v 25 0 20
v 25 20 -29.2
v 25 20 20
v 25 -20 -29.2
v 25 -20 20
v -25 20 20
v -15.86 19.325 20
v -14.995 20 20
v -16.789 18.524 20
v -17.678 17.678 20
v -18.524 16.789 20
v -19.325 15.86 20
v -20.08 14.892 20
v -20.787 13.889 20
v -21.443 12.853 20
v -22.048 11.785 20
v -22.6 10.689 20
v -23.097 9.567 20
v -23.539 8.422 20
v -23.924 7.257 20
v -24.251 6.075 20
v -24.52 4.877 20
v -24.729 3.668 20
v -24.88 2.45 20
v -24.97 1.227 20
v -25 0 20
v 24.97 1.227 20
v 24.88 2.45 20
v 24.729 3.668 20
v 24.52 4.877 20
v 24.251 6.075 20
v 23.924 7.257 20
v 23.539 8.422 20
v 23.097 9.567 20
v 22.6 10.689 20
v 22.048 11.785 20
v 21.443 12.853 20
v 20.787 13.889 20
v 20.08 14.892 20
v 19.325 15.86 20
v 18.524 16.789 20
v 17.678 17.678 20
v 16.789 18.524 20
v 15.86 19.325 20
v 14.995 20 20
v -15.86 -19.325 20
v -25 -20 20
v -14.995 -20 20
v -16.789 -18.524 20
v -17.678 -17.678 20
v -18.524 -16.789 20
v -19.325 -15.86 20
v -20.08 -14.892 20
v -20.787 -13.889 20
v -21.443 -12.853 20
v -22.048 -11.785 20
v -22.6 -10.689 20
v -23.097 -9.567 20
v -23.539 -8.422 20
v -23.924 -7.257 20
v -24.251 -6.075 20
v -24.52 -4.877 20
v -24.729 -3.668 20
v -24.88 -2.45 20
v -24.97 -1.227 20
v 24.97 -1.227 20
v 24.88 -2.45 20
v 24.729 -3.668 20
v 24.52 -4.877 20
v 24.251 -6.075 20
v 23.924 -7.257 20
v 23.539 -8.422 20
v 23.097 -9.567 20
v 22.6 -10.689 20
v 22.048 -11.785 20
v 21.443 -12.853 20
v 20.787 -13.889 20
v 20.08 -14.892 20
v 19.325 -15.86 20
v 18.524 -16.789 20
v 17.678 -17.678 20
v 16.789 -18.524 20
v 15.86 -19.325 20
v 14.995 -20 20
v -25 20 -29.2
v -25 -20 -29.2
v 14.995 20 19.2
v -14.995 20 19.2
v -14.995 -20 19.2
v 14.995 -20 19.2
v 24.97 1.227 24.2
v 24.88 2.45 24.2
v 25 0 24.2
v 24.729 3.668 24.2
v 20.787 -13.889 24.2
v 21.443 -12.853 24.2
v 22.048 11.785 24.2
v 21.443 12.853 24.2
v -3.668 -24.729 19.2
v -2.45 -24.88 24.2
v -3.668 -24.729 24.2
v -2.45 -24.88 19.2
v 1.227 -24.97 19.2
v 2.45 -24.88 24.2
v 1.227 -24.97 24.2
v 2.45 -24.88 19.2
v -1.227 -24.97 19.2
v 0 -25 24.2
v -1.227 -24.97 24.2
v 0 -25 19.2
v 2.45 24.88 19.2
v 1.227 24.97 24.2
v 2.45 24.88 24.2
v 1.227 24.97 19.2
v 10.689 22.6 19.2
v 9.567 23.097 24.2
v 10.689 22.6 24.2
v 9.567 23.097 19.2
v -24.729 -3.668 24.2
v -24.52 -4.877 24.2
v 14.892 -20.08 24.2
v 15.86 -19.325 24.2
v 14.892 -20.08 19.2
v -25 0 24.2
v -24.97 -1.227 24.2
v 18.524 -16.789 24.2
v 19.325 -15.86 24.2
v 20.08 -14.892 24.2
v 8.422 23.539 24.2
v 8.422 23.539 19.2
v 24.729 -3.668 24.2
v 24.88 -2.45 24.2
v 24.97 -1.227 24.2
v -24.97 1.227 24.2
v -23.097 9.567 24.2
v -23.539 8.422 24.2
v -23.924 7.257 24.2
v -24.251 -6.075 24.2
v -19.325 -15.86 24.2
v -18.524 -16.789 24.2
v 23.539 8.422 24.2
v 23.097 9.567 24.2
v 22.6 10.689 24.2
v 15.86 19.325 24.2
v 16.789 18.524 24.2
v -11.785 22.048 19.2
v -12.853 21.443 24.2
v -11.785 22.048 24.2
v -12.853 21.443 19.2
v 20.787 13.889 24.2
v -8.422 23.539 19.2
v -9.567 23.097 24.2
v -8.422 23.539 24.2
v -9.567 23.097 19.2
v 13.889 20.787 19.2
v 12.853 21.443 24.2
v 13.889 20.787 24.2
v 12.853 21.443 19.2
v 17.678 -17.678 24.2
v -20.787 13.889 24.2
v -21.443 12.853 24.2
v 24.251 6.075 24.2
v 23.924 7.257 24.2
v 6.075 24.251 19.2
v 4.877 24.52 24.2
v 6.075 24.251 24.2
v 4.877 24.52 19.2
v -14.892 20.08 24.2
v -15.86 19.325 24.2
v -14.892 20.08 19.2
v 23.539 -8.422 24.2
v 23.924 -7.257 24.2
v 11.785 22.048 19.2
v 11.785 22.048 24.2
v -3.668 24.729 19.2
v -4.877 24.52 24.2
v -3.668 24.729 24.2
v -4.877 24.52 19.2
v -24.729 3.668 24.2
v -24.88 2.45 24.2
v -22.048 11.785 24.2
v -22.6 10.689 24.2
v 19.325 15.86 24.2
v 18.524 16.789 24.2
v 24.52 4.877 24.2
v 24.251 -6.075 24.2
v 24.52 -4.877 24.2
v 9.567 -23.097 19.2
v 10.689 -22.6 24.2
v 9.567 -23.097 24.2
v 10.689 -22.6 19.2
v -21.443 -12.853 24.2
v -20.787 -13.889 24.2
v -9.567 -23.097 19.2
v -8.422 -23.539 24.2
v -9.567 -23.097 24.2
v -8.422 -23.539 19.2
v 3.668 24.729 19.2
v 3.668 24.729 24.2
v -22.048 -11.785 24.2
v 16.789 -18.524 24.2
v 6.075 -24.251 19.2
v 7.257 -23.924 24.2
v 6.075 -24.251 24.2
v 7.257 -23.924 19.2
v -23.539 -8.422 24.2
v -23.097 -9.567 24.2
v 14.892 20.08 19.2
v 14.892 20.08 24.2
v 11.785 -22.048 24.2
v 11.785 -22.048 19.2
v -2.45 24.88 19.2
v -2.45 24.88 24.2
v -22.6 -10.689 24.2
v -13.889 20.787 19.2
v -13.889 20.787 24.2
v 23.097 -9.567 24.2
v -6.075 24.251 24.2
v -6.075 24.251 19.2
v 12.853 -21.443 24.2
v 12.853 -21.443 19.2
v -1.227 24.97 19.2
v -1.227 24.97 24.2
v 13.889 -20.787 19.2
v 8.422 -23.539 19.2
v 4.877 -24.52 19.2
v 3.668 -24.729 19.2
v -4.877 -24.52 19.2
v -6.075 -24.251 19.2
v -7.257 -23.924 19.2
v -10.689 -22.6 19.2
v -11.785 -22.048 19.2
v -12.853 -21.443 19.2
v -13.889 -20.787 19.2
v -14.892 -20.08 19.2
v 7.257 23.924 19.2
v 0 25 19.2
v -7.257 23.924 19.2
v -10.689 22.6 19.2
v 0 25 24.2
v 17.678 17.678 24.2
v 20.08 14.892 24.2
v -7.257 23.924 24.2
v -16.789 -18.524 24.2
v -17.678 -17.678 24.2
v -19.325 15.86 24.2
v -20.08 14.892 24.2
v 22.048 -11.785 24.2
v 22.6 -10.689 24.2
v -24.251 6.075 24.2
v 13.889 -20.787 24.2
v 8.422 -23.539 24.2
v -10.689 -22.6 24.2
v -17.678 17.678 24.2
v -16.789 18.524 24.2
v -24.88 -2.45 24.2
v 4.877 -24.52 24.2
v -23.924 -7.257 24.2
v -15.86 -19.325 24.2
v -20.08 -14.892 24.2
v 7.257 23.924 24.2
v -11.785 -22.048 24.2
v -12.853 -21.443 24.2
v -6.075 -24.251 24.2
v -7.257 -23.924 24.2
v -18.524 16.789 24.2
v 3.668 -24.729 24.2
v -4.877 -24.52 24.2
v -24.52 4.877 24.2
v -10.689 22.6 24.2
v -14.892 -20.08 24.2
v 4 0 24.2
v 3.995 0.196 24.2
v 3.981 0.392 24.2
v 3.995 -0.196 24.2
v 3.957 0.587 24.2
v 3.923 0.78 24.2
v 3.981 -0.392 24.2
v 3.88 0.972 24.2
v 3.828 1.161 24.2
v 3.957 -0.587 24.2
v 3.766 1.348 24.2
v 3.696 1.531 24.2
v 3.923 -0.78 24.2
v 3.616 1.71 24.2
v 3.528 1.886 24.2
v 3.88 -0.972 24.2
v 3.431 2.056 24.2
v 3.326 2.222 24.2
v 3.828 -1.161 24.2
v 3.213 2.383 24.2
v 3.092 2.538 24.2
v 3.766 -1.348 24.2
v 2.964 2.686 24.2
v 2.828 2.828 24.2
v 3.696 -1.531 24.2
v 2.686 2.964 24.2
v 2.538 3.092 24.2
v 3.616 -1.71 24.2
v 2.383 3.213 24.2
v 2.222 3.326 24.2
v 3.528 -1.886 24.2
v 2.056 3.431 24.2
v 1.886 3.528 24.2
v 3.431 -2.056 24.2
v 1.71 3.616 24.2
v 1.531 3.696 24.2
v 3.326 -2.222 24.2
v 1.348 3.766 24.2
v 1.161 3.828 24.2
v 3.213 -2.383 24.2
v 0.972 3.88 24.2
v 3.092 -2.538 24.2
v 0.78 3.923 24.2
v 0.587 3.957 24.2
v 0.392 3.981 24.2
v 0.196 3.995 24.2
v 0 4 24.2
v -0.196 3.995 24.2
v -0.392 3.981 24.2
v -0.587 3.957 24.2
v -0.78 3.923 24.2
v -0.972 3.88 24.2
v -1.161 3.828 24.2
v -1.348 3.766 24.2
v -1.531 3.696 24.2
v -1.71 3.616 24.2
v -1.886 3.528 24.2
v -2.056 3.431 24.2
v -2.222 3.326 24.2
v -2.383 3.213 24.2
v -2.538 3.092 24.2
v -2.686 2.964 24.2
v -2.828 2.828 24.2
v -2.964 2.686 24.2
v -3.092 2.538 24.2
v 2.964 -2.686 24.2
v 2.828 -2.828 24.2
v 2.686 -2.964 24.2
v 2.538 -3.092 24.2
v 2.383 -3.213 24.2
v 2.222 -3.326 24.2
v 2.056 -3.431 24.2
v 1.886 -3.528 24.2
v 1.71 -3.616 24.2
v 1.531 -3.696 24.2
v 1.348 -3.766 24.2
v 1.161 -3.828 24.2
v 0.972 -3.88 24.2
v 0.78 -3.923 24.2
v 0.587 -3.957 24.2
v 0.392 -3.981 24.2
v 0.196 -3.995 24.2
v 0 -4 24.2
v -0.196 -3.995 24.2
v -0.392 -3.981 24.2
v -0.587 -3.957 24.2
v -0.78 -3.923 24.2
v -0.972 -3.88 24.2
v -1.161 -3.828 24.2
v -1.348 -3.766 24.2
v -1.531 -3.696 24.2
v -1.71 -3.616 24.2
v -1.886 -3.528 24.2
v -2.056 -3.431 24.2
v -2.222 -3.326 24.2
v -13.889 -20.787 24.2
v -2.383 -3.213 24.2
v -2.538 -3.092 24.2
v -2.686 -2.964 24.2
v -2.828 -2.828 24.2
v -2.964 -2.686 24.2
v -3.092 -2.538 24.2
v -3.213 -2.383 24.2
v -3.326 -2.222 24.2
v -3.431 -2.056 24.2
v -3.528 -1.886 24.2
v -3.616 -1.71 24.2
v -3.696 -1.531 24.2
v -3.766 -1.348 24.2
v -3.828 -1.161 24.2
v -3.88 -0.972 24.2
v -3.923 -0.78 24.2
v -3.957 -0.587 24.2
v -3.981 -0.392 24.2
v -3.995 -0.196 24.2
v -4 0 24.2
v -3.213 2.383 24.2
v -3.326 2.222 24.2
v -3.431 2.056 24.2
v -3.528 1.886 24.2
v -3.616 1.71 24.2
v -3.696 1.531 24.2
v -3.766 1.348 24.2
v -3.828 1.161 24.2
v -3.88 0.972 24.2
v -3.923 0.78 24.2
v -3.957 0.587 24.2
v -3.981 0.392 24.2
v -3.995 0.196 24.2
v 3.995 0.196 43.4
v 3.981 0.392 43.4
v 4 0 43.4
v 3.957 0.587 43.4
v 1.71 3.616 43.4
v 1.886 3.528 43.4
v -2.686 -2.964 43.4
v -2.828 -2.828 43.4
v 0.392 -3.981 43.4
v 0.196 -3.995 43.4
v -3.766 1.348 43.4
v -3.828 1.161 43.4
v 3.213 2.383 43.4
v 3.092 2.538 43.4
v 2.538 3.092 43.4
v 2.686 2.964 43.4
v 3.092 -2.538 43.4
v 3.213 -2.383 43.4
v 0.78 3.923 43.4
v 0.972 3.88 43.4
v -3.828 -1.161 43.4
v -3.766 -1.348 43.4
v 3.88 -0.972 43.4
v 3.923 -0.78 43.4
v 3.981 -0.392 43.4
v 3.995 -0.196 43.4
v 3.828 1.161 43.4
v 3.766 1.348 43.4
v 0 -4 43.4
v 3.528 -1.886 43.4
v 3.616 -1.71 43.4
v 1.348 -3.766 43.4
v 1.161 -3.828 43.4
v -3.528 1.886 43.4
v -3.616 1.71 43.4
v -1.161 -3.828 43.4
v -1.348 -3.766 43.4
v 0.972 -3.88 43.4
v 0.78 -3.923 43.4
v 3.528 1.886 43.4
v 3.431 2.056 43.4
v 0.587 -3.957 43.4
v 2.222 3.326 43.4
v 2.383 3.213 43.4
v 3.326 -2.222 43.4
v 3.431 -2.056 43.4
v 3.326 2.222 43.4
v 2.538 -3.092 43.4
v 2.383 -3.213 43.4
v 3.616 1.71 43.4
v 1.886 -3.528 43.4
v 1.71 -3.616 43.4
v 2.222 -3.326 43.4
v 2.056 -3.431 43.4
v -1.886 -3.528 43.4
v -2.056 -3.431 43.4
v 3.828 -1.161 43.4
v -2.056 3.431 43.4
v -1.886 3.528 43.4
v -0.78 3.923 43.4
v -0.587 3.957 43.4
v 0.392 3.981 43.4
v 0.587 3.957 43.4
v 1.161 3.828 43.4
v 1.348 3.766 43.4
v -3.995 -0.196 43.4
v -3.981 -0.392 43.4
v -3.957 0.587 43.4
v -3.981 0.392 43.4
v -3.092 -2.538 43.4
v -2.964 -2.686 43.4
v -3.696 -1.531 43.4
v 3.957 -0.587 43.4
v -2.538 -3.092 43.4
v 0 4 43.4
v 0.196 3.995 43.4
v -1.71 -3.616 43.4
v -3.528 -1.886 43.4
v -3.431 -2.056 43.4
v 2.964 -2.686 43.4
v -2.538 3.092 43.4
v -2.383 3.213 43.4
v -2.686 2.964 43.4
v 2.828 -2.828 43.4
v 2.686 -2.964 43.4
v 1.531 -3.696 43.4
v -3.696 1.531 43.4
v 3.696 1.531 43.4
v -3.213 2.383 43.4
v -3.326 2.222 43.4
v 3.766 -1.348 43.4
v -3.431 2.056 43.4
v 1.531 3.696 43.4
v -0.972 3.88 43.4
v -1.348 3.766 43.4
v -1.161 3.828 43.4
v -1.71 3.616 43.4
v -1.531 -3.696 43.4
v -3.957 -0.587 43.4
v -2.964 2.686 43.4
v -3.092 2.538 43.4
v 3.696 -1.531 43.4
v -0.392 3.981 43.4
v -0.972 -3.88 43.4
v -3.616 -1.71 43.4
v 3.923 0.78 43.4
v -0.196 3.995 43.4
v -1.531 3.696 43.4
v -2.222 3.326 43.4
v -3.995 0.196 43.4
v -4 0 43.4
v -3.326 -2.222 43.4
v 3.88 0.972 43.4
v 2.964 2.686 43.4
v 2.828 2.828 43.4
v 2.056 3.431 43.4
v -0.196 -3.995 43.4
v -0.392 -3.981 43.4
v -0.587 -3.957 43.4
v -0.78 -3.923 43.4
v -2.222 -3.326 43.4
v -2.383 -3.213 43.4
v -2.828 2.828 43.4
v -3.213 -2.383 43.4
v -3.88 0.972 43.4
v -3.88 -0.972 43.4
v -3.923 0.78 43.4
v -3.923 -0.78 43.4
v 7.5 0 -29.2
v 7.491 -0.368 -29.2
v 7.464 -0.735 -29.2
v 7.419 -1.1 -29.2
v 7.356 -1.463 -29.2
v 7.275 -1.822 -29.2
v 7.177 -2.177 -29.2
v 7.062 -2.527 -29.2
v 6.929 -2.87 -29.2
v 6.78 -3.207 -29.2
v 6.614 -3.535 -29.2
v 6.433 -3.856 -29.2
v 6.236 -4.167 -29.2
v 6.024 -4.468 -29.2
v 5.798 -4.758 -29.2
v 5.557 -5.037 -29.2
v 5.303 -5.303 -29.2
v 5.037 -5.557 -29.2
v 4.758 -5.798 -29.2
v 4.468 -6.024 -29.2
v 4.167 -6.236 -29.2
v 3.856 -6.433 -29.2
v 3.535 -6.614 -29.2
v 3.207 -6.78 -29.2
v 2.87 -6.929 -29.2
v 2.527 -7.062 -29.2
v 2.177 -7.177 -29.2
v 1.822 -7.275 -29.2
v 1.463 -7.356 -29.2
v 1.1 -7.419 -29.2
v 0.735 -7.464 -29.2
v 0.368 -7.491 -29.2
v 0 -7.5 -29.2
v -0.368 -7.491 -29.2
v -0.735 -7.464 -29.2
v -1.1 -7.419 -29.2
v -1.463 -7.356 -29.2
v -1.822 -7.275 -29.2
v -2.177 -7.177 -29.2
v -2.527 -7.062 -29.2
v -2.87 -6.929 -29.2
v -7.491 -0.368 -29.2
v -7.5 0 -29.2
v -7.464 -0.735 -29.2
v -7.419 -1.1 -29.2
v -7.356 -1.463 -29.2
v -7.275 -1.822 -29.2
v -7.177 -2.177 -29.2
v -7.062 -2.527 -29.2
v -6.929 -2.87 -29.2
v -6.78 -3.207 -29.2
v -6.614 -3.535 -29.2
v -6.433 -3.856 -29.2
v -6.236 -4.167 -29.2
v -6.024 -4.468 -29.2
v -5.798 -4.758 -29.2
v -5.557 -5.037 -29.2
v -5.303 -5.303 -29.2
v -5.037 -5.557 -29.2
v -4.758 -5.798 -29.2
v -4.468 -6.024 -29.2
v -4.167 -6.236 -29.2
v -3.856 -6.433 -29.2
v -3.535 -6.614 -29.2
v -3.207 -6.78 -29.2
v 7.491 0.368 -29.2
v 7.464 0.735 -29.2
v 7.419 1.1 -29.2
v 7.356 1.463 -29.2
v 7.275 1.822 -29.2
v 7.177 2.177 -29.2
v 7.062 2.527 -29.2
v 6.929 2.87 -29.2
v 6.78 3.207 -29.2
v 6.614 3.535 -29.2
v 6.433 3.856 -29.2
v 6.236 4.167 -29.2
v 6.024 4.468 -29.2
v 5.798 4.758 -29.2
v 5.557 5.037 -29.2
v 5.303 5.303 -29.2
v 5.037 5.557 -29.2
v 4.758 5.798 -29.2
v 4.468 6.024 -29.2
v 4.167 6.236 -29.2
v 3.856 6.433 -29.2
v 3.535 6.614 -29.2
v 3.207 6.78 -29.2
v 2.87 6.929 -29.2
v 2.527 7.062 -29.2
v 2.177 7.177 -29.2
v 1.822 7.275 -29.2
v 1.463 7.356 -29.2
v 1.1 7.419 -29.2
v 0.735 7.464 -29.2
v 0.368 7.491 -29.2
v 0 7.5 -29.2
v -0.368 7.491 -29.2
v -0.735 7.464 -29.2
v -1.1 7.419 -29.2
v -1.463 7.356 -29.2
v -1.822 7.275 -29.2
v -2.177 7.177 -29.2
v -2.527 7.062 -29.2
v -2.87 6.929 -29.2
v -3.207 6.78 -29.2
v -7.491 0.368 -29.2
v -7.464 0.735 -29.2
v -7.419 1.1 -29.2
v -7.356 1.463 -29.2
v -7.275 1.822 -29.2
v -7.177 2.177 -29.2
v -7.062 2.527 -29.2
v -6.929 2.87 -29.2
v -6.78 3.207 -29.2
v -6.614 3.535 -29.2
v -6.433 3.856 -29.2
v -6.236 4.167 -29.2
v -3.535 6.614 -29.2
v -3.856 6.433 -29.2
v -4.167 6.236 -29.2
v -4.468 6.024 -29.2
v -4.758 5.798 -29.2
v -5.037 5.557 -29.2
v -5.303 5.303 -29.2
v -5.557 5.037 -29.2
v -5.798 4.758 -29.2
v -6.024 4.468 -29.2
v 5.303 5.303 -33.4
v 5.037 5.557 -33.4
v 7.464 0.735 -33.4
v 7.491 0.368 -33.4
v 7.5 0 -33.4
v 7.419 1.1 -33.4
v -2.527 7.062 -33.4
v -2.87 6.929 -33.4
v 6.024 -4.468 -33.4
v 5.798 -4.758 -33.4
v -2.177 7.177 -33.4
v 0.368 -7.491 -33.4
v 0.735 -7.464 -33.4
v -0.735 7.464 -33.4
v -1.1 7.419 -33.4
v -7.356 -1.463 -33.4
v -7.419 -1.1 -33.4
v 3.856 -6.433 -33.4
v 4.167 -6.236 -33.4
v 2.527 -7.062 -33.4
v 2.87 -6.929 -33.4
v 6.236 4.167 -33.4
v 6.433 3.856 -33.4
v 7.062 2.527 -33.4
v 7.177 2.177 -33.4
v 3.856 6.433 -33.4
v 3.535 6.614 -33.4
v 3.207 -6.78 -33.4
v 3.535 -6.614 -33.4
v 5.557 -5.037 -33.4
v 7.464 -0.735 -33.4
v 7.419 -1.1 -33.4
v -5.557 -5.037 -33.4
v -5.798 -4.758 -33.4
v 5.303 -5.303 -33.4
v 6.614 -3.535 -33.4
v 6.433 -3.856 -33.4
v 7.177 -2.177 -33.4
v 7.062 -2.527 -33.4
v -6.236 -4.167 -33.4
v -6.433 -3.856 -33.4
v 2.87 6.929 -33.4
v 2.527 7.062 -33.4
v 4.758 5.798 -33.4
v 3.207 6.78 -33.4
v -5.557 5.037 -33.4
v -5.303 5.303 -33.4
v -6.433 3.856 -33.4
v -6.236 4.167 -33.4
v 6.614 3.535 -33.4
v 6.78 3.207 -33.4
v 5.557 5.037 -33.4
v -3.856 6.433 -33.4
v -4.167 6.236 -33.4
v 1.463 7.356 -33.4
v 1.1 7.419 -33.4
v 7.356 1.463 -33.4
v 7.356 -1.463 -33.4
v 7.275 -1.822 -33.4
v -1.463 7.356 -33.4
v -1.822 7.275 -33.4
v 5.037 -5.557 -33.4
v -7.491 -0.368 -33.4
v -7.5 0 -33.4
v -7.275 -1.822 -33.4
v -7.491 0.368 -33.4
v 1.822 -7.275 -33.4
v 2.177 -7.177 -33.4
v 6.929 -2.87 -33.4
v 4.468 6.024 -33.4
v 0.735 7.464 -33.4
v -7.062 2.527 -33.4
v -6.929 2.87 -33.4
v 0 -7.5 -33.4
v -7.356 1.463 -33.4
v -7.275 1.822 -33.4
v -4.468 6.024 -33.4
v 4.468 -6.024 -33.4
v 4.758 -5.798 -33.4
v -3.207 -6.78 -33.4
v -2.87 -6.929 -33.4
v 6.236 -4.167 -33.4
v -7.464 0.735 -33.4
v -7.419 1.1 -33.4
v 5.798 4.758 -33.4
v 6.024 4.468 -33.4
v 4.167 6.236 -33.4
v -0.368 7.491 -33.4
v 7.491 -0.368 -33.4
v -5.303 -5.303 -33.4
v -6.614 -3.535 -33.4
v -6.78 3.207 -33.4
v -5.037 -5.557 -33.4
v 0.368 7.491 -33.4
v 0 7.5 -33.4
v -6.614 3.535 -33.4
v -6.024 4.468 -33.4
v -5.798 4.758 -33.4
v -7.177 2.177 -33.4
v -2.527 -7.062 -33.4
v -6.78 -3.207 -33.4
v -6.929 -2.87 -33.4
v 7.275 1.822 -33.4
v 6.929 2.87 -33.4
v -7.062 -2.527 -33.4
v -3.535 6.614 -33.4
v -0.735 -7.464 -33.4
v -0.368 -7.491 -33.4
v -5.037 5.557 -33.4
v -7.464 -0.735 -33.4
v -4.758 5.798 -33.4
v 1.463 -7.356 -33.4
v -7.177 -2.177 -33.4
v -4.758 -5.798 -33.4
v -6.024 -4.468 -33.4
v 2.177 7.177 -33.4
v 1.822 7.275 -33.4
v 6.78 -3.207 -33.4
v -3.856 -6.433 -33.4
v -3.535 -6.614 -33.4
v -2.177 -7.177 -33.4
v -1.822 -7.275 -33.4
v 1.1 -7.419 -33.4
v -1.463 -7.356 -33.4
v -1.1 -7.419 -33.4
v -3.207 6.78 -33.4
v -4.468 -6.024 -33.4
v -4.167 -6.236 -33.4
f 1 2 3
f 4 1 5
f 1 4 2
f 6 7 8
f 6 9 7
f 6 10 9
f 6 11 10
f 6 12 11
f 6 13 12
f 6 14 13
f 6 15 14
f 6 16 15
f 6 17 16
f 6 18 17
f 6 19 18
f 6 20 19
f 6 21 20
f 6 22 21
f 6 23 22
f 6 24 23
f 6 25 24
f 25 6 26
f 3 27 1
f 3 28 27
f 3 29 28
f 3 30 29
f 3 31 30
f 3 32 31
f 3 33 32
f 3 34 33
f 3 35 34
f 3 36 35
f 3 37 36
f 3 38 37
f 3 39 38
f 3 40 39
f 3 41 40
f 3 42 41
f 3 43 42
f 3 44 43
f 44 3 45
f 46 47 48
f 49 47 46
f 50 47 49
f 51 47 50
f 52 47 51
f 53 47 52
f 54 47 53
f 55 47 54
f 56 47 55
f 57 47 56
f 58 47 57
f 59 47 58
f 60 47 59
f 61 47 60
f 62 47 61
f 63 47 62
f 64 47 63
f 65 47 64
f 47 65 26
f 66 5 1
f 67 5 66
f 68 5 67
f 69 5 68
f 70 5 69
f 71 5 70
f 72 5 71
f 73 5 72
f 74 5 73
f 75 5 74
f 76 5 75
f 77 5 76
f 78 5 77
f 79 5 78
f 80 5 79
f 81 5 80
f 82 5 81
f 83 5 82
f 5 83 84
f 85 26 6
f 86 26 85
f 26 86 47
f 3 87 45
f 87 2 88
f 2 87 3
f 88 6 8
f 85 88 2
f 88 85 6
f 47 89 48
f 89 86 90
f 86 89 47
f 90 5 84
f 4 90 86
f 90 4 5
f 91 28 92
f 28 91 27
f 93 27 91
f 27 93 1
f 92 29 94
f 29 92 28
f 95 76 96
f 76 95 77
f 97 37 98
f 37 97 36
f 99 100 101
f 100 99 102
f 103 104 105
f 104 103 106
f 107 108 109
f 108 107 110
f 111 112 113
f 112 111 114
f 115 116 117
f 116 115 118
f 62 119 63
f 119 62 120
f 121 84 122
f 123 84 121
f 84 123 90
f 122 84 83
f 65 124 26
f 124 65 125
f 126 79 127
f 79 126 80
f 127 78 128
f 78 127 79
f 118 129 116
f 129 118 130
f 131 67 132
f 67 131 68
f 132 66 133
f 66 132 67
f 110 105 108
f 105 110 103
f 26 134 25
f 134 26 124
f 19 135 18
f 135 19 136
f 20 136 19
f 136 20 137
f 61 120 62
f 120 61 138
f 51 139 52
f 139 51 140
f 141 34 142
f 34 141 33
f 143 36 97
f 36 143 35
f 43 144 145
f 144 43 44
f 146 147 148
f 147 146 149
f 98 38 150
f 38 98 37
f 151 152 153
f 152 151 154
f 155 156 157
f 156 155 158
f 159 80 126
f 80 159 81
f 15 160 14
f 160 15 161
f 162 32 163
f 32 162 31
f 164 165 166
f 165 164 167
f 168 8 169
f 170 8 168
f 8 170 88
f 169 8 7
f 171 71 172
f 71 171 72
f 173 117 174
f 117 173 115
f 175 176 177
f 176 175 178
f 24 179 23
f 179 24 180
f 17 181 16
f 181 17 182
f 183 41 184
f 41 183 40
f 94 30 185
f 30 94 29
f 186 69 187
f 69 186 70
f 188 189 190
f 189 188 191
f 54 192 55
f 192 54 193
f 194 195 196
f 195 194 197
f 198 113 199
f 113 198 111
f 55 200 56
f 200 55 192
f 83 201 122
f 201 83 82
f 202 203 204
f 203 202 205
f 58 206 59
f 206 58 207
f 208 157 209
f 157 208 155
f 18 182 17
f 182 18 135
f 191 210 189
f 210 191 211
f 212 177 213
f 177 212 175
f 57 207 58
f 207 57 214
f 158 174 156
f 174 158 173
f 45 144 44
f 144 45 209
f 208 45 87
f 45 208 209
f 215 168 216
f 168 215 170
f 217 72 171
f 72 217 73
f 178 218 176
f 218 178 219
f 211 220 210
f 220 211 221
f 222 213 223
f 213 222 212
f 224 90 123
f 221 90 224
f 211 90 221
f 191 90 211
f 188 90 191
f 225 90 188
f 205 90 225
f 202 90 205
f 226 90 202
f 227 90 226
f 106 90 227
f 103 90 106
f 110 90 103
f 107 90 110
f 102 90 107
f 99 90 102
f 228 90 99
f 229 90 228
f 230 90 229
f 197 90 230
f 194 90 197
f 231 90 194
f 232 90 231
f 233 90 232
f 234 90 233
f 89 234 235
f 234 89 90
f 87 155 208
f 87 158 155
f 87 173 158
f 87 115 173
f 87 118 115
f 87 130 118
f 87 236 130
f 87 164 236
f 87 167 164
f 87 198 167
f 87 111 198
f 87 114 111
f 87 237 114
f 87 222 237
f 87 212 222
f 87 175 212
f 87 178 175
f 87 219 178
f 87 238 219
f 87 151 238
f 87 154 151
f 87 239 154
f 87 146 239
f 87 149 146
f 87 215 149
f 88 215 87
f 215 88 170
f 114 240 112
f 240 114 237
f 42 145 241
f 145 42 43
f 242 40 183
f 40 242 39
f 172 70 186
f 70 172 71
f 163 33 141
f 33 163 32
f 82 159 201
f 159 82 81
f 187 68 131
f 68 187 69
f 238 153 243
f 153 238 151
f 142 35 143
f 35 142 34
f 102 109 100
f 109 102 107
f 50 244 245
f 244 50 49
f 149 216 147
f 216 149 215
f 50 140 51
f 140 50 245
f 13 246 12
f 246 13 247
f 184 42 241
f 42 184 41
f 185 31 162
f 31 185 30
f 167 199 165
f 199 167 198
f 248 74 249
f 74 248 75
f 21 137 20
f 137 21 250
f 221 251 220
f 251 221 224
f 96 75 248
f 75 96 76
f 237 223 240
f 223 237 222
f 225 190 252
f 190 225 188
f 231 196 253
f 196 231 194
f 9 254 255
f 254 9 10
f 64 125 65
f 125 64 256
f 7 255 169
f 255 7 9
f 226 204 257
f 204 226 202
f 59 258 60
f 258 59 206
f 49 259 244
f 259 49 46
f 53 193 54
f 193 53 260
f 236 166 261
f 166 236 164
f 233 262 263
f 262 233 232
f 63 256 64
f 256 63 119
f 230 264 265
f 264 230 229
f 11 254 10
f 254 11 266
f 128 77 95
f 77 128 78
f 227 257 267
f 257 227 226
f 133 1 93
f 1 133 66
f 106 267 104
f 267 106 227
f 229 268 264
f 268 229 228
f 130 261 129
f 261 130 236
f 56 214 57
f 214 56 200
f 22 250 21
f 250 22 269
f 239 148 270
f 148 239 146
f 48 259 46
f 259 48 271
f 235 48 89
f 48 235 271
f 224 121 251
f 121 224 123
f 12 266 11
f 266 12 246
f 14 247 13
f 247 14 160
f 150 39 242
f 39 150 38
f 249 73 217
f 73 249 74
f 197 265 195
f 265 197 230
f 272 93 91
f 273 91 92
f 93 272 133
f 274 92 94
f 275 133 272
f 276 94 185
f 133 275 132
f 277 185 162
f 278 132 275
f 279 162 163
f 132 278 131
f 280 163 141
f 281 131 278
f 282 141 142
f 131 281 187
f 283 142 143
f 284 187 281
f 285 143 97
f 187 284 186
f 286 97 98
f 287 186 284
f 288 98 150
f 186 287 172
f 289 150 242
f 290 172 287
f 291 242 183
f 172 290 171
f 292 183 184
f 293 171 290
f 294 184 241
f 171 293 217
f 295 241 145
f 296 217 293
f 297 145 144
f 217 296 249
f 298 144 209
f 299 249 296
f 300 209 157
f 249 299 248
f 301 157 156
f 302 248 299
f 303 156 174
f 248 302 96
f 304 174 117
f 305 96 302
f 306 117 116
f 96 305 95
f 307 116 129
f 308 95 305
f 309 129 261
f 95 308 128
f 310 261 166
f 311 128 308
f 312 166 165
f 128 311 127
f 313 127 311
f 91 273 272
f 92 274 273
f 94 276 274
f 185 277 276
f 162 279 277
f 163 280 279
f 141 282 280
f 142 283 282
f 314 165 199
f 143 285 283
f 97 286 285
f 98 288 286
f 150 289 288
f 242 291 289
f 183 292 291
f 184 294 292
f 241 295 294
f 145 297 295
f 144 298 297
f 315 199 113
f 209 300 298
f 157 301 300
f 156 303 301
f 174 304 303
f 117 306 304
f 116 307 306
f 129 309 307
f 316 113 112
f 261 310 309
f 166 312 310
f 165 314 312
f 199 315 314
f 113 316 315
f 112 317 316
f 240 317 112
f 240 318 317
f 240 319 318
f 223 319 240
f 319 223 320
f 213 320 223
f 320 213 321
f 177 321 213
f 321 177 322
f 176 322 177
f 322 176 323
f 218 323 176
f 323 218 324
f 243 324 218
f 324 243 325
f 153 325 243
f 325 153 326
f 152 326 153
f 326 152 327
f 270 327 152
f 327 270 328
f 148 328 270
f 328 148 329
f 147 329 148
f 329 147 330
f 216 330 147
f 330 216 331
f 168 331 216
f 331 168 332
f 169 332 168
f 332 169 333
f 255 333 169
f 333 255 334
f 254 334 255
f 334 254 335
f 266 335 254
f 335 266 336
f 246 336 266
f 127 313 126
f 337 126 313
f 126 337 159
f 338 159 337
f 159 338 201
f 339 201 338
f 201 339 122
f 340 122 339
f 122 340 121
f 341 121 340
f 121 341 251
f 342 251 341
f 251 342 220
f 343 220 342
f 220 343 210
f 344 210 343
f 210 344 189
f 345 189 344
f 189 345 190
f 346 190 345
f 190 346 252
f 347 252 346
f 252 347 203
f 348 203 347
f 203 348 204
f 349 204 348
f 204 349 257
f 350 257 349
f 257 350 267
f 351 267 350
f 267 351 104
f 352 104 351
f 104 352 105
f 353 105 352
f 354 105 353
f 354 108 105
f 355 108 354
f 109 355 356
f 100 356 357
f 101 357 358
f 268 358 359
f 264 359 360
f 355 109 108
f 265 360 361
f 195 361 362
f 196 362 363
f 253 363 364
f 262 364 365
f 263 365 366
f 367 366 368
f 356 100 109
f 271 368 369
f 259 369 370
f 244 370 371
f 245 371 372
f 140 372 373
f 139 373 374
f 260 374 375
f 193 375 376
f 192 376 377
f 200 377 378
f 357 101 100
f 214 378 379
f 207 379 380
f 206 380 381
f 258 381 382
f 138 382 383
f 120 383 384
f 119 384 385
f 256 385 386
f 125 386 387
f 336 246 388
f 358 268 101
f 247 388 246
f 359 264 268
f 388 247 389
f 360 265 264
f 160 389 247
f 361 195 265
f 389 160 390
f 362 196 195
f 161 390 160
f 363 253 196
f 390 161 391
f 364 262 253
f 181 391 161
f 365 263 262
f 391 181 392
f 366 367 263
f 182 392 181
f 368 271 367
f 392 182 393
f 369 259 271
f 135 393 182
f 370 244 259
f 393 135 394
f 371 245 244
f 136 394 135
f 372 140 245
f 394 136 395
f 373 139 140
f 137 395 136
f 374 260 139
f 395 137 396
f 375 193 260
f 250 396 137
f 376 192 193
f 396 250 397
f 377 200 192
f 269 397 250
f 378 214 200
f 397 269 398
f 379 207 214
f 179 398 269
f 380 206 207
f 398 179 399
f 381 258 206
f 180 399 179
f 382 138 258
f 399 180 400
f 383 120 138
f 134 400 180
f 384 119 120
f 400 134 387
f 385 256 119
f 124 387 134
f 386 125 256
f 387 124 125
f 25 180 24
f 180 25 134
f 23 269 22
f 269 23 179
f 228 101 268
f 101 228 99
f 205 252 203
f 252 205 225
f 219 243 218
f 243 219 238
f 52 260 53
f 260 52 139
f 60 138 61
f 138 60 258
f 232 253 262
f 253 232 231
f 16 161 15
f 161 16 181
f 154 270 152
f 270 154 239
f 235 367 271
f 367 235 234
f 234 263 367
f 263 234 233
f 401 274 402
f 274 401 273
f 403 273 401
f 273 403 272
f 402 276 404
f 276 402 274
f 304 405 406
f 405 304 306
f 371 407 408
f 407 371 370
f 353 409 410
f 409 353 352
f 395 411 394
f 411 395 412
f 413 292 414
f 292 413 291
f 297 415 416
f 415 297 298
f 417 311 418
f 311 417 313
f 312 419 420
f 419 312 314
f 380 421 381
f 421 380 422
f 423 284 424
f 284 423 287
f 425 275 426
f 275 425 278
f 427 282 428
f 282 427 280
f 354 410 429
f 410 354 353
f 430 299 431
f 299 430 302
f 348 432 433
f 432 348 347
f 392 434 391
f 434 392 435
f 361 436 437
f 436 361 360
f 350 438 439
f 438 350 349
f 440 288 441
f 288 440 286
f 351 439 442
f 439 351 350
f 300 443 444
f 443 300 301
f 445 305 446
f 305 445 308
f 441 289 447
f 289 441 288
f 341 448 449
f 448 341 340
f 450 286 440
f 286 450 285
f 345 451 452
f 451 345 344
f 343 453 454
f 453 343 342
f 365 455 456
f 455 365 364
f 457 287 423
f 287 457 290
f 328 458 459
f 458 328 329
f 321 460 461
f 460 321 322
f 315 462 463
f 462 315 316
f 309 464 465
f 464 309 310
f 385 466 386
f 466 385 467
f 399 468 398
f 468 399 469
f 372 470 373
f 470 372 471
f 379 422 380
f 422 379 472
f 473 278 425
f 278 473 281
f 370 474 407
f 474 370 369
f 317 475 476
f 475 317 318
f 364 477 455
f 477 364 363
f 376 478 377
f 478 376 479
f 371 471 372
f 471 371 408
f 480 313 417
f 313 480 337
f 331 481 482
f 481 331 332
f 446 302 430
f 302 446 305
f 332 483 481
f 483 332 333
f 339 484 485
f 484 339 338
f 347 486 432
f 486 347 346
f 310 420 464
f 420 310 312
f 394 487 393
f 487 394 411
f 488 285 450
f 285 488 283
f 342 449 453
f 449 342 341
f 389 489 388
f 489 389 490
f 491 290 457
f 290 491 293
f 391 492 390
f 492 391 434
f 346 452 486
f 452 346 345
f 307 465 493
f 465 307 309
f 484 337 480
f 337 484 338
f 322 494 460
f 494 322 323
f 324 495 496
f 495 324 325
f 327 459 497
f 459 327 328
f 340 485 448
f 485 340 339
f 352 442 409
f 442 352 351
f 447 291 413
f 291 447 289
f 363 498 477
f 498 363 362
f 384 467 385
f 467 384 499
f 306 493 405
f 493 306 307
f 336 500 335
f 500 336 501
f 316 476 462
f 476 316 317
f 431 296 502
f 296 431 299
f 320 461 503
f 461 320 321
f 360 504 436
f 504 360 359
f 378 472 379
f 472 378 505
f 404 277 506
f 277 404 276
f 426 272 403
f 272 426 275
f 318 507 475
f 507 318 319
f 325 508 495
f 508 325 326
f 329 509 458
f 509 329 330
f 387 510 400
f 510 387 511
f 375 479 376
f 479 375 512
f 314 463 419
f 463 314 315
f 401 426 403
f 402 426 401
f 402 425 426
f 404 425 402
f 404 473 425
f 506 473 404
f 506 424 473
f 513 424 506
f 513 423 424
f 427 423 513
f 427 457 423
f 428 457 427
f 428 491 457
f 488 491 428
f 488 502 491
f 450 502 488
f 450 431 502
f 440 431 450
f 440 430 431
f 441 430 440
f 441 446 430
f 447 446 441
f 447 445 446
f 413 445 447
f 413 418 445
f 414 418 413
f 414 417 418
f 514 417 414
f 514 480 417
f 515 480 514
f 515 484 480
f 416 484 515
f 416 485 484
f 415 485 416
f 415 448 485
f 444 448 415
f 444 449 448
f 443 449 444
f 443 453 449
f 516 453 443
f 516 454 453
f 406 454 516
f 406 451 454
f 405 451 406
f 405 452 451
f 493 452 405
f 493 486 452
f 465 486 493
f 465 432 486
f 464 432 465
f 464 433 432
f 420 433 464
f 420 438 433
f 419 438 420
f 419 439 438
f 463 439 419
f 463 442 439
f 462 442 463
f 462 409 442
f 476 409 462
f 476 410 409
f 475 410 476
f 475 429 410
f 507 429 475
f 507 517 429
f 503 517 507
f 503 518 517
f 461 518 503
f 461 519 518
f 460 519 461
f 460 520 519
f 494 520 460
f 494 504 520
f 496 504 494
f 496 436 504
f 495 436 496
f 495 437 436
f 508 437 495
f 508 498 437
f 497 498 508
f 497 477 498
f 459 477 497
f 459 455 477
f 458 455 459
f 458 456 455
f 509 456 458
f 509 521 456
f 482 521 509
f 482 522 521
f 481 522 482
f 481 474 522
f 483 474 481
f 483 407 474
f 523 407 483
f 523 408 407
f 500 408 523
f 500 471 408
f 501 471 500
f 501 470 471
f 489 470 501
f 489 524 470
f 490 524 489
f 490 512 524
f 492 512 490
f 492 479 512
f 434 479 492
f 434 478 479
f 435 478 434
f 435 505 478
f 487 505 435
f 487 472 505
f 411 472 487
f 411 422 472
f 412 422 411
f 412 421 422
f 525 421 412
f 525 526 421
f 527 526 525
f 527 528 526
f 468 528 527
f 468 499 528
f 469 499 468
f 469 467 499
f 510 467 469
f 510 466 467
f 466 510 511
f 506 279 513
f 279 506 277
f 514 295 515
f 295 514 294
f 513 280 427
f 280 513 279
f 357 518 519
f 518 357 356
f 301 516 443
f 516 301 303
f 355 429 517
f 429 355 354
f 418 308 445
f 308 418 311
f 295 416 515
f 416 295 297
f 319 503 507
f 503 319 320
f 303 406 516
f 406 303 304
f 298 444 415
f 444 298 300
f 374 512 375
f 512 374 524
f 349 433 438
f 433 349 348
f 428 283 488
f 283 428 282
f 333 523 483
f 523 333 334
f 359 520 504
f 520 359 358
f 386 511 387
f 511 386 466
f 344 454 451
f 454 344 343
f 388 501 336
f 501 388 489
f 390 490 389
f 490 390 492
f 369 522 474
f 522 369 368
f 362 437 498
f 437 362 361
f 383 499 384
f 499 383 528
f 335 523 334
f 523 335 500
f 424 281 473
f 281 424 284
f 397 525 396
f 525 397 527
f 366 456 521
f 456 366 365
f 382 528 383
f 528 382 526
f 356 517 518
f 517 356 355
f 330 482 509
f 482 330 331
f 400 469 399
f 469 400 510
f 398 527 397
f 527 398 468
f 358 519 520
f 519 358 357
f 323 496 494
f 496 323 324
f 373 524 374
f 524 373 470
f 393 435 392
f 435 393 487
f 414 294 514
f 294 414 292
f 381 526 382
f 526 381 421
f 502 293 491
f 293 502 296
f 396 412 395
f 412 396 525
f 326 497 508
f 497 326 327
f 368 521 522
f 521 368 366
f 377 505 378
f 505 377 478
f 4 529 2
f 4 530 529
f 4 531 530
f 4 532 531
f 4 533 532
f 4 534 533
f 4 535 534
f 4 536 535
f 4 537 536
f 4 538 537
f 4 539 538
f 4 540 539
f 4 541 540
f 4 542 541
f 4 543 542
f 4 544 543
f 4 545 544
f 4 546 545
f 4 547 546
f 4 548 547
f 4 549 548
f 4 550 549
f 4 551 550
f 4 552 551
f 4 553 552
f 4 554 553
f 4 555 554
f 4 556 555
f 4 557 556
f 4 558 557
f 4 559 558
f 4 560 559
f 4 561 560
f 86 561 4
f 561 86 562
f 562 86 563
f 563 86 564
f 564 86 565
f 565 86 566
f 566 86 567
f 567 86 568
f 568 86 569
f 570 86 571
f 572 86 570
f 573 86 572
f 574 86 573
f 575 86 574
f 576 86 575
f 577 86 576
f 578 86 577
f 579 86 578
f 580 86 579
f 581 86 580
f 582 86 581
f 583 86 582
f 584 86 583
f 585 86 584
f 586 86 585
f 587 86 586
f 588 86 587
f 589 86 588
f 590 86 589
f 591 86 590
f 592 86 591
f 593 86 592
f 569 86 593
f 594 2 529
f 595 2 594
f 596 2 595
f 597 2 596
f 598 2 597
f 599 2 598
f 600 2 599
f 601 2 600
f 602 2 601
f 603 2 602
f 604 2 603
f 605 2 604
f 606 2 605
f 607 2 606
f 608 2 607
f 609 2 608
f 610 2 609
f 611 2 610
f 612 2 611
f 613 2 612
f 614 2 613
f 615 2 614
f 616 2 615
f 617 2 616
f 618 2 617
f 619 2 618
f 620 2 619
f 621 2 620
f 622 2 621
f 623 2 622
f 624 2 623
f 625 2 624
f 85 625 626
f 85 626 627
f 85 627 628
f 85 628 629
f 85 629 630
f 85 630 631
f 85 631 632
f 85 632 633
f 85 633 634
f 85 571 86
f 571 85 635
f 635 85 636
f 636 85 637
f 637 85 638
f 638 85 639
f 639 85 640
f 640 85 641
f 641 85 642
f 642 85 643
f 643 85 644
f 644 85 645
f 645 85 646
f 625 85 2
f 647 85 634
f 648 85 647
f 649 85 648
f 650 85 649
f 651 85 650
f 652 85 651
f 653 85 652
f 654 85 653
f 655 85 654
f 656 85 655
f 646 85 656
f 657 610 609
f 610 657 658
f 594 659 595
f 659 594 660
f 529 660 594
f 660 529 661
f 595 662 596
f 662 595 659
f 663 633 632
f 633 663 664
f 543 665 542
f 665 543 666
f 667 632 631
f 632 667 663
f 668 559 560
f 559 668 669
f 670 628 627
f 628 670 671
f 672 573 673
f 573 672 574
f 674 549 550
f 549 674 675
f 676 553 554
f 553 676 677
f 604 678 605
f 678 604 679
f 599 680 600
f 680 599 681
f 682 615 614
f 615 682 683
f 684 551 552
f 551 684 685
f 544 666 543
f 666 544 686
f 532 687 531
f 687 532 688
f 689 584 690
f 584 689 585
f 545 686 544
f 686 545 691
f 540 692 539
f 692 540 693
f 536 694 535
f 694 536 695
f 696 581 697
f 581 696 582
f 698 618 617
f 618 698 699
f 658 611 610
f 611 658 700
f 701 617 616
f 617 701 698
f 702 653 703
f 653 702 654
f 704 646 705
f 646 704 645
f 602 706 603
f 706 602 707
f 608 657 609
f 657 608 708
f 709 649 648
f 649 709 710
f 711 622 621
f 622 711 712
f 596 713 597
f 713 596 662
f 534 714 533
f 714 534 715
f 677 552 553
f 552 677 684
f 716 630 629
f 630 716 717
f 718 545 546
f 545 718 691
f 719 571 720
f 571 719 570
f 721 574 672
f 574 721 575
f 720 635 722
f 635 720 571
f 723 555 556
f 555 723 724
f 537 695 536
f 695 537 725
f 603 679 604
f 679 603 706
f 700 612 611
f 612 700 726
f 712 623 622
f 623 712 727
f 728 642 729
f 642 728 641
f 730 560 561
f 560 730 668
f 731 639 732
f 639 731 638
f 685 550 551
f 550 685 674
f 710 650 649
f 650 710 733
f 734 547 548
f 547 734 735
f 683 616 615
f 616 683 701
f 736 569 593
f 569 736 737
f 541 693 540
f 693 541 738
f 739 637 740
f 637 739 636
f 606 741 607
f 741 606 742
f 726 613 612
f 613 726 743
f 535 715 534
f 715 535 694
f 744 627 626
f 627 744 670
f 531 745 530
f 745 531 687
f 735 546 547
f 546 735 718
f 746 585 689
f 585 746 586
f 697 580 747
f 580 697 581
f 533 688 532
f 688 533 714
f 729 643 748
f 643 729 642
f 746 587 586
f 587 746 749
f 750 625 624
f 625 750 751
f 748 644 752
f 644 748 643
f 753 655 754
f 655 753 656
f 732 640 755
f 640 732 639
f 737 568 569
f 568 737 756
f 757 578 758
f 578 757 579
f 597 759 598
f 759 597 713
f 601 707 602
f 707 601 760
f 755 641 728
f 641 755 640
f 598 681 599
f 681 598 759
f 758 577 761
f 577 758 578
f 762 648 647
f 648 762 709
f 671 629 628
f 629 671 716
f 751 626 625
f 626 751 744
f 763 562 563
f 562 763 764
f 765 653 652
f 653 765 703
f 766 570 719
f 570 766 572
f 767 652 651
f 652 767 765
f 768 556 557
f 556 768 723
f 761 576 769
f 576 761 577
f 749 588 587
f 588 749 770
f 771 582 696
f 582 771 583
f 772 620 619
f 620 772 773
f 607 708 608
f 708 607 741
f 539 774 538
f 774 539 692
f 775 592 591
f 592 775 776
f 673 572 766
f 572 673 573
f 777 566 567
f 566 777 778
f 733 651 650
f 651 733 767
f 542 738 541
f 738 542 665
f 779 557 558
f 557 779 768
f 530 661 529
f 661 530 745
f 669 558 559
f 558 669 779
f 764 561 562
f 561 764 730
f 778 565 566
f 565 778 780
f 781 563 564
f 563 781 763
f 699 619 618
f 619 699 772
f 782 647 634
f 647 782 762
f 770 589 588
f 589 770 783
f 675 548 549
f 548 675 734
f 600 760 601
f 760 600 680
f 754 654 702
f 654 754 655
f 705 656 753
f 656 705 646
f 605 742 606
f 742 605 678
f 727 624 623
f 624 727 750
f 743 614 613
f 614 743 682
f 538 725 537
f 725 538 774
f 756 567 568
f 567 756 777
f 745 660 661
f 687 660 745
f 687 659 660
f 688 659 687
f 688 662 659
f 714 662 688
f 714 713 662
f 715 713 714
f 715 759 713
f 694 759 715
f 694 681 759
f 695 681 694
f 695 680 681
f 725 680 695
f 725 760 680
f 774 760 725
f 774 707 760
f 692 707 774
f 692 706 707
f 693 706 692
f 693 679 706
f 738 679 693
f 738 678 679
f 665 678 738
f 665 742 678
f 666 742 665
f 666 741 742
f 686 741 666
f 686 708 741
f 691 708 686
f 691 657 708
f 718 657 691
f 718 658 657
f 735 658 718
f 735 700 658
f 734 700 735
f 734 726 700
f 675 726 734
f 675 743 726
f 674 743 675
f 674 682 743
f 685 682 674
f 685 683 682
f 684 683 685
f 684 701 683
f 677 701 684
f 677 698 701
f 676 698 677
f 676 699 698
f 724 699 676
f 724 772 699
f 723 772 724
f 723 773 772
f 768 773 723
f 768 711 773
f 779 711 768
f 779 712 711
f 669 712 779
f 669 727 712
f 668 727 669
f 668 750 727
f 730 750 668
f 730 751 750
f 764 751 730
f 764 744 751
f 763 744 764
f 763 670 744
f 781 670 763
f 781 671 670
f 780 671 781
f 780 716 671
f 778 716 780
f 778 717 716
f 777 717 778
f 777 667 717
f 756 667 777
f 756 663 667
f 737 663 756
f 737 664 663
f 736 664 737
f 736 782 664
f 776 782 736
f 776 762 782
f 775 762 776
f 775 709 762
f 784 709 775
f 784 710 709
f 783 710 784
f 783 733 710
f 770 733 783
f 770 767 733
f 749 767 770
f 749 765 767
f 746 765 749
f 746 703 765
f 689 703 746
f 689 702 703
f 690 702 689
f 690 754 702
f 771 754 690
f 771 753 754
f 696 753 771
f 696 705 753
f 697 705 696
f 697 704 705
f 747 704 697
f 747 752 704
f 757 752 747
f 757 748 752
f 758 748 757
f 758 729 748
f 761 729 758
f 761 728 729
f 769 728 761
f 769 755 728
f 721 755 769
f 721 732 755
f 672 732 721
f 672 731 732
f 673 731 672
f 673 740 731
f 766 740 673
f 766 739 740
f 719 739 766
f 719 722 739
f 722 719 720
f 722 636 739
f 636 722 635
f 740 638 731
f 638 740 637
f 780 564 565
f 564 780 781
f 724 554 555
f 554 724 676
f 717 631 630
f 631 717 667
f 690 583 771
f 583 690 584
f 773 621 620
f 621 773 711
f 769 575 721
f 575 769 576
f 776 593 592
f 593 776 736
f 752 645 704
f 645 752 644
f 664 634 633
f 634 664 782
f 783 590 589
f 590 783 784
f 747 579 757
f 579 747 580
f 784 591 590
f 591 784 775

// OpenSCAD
$fn = 128;

// Lichuan -80M02430B (approximate, simplified) — ONE connected solid
// Fixes: ensure all parts overlap/connect via dimension-based formulas (no arbitrary offsets)

motor_body_length = 50;
motor_body_width  = 40;
motor_body_height = 40;

flange_thickness  = 5;
flange_diameter   = 50;

shaft_diameter    = 8;
shaft_length      = 20;

rear_cap_length   = 10;

connector_boss_diameter = 15;
connector_boss_length   = 5;

overlap = 0.8; // guaranteed overlap for manifold union

// Z references
z_body_center = 0;
z_body_top    = z_body_center + motor_body_height/2;
z_body_bottom = z_body_center - motor_body_height/2;

// Connected stack (all center=true)
z_flange_center = z_body_top + flange_thickness/2 - overlap;
z_flange_top    = z_flange_center + flange_thickness/2;

z_shaft_center  = z_flange_top + shaft_length/2 - overlap;

z_rear_center   = z_body_bottom - rear_cap_length/2 + overlap;
z_rear_bottom   = z_rear_center - rear_cap_length/2;

z_boss_center   = z_rear_bottom - connector_boss_length/2 + overlap;

// Modules
module motor_body() {
    translate([0, 0, z_body_center])
        cube([motor_body_length, motor_body_width, motor_body_height], center=true);
}

module front_flange() {
    translate([0, 0, z_flange_center])
        cylinder(h=flange_thickness, d=flange_diameter, center=true);
}

module output_shaft() {
    translate([0, 0, z_shaft_center])
        cylinder(h=shaft_length, d=shaft_diameter, center=true);
}

module rear_cap() {
    translate([0, 0, z_rear_center])
        cube([motor_body_length, motor_body_width, rear_cap_length], center=true);
}

module cable_connector_boss() {
    translate([0, 0, z_boss_center])
        cylinder(h=connector_boss_length, d=connector_boss_diameter, center=true);
}

// Assembly (ONE connected solid)
module servo_motor() {
    union() {
        motor_body();
        front_flange();
        output_shaft();
        rear_cap();
        cable_connector_boss();
    }
}

servo_motor();
